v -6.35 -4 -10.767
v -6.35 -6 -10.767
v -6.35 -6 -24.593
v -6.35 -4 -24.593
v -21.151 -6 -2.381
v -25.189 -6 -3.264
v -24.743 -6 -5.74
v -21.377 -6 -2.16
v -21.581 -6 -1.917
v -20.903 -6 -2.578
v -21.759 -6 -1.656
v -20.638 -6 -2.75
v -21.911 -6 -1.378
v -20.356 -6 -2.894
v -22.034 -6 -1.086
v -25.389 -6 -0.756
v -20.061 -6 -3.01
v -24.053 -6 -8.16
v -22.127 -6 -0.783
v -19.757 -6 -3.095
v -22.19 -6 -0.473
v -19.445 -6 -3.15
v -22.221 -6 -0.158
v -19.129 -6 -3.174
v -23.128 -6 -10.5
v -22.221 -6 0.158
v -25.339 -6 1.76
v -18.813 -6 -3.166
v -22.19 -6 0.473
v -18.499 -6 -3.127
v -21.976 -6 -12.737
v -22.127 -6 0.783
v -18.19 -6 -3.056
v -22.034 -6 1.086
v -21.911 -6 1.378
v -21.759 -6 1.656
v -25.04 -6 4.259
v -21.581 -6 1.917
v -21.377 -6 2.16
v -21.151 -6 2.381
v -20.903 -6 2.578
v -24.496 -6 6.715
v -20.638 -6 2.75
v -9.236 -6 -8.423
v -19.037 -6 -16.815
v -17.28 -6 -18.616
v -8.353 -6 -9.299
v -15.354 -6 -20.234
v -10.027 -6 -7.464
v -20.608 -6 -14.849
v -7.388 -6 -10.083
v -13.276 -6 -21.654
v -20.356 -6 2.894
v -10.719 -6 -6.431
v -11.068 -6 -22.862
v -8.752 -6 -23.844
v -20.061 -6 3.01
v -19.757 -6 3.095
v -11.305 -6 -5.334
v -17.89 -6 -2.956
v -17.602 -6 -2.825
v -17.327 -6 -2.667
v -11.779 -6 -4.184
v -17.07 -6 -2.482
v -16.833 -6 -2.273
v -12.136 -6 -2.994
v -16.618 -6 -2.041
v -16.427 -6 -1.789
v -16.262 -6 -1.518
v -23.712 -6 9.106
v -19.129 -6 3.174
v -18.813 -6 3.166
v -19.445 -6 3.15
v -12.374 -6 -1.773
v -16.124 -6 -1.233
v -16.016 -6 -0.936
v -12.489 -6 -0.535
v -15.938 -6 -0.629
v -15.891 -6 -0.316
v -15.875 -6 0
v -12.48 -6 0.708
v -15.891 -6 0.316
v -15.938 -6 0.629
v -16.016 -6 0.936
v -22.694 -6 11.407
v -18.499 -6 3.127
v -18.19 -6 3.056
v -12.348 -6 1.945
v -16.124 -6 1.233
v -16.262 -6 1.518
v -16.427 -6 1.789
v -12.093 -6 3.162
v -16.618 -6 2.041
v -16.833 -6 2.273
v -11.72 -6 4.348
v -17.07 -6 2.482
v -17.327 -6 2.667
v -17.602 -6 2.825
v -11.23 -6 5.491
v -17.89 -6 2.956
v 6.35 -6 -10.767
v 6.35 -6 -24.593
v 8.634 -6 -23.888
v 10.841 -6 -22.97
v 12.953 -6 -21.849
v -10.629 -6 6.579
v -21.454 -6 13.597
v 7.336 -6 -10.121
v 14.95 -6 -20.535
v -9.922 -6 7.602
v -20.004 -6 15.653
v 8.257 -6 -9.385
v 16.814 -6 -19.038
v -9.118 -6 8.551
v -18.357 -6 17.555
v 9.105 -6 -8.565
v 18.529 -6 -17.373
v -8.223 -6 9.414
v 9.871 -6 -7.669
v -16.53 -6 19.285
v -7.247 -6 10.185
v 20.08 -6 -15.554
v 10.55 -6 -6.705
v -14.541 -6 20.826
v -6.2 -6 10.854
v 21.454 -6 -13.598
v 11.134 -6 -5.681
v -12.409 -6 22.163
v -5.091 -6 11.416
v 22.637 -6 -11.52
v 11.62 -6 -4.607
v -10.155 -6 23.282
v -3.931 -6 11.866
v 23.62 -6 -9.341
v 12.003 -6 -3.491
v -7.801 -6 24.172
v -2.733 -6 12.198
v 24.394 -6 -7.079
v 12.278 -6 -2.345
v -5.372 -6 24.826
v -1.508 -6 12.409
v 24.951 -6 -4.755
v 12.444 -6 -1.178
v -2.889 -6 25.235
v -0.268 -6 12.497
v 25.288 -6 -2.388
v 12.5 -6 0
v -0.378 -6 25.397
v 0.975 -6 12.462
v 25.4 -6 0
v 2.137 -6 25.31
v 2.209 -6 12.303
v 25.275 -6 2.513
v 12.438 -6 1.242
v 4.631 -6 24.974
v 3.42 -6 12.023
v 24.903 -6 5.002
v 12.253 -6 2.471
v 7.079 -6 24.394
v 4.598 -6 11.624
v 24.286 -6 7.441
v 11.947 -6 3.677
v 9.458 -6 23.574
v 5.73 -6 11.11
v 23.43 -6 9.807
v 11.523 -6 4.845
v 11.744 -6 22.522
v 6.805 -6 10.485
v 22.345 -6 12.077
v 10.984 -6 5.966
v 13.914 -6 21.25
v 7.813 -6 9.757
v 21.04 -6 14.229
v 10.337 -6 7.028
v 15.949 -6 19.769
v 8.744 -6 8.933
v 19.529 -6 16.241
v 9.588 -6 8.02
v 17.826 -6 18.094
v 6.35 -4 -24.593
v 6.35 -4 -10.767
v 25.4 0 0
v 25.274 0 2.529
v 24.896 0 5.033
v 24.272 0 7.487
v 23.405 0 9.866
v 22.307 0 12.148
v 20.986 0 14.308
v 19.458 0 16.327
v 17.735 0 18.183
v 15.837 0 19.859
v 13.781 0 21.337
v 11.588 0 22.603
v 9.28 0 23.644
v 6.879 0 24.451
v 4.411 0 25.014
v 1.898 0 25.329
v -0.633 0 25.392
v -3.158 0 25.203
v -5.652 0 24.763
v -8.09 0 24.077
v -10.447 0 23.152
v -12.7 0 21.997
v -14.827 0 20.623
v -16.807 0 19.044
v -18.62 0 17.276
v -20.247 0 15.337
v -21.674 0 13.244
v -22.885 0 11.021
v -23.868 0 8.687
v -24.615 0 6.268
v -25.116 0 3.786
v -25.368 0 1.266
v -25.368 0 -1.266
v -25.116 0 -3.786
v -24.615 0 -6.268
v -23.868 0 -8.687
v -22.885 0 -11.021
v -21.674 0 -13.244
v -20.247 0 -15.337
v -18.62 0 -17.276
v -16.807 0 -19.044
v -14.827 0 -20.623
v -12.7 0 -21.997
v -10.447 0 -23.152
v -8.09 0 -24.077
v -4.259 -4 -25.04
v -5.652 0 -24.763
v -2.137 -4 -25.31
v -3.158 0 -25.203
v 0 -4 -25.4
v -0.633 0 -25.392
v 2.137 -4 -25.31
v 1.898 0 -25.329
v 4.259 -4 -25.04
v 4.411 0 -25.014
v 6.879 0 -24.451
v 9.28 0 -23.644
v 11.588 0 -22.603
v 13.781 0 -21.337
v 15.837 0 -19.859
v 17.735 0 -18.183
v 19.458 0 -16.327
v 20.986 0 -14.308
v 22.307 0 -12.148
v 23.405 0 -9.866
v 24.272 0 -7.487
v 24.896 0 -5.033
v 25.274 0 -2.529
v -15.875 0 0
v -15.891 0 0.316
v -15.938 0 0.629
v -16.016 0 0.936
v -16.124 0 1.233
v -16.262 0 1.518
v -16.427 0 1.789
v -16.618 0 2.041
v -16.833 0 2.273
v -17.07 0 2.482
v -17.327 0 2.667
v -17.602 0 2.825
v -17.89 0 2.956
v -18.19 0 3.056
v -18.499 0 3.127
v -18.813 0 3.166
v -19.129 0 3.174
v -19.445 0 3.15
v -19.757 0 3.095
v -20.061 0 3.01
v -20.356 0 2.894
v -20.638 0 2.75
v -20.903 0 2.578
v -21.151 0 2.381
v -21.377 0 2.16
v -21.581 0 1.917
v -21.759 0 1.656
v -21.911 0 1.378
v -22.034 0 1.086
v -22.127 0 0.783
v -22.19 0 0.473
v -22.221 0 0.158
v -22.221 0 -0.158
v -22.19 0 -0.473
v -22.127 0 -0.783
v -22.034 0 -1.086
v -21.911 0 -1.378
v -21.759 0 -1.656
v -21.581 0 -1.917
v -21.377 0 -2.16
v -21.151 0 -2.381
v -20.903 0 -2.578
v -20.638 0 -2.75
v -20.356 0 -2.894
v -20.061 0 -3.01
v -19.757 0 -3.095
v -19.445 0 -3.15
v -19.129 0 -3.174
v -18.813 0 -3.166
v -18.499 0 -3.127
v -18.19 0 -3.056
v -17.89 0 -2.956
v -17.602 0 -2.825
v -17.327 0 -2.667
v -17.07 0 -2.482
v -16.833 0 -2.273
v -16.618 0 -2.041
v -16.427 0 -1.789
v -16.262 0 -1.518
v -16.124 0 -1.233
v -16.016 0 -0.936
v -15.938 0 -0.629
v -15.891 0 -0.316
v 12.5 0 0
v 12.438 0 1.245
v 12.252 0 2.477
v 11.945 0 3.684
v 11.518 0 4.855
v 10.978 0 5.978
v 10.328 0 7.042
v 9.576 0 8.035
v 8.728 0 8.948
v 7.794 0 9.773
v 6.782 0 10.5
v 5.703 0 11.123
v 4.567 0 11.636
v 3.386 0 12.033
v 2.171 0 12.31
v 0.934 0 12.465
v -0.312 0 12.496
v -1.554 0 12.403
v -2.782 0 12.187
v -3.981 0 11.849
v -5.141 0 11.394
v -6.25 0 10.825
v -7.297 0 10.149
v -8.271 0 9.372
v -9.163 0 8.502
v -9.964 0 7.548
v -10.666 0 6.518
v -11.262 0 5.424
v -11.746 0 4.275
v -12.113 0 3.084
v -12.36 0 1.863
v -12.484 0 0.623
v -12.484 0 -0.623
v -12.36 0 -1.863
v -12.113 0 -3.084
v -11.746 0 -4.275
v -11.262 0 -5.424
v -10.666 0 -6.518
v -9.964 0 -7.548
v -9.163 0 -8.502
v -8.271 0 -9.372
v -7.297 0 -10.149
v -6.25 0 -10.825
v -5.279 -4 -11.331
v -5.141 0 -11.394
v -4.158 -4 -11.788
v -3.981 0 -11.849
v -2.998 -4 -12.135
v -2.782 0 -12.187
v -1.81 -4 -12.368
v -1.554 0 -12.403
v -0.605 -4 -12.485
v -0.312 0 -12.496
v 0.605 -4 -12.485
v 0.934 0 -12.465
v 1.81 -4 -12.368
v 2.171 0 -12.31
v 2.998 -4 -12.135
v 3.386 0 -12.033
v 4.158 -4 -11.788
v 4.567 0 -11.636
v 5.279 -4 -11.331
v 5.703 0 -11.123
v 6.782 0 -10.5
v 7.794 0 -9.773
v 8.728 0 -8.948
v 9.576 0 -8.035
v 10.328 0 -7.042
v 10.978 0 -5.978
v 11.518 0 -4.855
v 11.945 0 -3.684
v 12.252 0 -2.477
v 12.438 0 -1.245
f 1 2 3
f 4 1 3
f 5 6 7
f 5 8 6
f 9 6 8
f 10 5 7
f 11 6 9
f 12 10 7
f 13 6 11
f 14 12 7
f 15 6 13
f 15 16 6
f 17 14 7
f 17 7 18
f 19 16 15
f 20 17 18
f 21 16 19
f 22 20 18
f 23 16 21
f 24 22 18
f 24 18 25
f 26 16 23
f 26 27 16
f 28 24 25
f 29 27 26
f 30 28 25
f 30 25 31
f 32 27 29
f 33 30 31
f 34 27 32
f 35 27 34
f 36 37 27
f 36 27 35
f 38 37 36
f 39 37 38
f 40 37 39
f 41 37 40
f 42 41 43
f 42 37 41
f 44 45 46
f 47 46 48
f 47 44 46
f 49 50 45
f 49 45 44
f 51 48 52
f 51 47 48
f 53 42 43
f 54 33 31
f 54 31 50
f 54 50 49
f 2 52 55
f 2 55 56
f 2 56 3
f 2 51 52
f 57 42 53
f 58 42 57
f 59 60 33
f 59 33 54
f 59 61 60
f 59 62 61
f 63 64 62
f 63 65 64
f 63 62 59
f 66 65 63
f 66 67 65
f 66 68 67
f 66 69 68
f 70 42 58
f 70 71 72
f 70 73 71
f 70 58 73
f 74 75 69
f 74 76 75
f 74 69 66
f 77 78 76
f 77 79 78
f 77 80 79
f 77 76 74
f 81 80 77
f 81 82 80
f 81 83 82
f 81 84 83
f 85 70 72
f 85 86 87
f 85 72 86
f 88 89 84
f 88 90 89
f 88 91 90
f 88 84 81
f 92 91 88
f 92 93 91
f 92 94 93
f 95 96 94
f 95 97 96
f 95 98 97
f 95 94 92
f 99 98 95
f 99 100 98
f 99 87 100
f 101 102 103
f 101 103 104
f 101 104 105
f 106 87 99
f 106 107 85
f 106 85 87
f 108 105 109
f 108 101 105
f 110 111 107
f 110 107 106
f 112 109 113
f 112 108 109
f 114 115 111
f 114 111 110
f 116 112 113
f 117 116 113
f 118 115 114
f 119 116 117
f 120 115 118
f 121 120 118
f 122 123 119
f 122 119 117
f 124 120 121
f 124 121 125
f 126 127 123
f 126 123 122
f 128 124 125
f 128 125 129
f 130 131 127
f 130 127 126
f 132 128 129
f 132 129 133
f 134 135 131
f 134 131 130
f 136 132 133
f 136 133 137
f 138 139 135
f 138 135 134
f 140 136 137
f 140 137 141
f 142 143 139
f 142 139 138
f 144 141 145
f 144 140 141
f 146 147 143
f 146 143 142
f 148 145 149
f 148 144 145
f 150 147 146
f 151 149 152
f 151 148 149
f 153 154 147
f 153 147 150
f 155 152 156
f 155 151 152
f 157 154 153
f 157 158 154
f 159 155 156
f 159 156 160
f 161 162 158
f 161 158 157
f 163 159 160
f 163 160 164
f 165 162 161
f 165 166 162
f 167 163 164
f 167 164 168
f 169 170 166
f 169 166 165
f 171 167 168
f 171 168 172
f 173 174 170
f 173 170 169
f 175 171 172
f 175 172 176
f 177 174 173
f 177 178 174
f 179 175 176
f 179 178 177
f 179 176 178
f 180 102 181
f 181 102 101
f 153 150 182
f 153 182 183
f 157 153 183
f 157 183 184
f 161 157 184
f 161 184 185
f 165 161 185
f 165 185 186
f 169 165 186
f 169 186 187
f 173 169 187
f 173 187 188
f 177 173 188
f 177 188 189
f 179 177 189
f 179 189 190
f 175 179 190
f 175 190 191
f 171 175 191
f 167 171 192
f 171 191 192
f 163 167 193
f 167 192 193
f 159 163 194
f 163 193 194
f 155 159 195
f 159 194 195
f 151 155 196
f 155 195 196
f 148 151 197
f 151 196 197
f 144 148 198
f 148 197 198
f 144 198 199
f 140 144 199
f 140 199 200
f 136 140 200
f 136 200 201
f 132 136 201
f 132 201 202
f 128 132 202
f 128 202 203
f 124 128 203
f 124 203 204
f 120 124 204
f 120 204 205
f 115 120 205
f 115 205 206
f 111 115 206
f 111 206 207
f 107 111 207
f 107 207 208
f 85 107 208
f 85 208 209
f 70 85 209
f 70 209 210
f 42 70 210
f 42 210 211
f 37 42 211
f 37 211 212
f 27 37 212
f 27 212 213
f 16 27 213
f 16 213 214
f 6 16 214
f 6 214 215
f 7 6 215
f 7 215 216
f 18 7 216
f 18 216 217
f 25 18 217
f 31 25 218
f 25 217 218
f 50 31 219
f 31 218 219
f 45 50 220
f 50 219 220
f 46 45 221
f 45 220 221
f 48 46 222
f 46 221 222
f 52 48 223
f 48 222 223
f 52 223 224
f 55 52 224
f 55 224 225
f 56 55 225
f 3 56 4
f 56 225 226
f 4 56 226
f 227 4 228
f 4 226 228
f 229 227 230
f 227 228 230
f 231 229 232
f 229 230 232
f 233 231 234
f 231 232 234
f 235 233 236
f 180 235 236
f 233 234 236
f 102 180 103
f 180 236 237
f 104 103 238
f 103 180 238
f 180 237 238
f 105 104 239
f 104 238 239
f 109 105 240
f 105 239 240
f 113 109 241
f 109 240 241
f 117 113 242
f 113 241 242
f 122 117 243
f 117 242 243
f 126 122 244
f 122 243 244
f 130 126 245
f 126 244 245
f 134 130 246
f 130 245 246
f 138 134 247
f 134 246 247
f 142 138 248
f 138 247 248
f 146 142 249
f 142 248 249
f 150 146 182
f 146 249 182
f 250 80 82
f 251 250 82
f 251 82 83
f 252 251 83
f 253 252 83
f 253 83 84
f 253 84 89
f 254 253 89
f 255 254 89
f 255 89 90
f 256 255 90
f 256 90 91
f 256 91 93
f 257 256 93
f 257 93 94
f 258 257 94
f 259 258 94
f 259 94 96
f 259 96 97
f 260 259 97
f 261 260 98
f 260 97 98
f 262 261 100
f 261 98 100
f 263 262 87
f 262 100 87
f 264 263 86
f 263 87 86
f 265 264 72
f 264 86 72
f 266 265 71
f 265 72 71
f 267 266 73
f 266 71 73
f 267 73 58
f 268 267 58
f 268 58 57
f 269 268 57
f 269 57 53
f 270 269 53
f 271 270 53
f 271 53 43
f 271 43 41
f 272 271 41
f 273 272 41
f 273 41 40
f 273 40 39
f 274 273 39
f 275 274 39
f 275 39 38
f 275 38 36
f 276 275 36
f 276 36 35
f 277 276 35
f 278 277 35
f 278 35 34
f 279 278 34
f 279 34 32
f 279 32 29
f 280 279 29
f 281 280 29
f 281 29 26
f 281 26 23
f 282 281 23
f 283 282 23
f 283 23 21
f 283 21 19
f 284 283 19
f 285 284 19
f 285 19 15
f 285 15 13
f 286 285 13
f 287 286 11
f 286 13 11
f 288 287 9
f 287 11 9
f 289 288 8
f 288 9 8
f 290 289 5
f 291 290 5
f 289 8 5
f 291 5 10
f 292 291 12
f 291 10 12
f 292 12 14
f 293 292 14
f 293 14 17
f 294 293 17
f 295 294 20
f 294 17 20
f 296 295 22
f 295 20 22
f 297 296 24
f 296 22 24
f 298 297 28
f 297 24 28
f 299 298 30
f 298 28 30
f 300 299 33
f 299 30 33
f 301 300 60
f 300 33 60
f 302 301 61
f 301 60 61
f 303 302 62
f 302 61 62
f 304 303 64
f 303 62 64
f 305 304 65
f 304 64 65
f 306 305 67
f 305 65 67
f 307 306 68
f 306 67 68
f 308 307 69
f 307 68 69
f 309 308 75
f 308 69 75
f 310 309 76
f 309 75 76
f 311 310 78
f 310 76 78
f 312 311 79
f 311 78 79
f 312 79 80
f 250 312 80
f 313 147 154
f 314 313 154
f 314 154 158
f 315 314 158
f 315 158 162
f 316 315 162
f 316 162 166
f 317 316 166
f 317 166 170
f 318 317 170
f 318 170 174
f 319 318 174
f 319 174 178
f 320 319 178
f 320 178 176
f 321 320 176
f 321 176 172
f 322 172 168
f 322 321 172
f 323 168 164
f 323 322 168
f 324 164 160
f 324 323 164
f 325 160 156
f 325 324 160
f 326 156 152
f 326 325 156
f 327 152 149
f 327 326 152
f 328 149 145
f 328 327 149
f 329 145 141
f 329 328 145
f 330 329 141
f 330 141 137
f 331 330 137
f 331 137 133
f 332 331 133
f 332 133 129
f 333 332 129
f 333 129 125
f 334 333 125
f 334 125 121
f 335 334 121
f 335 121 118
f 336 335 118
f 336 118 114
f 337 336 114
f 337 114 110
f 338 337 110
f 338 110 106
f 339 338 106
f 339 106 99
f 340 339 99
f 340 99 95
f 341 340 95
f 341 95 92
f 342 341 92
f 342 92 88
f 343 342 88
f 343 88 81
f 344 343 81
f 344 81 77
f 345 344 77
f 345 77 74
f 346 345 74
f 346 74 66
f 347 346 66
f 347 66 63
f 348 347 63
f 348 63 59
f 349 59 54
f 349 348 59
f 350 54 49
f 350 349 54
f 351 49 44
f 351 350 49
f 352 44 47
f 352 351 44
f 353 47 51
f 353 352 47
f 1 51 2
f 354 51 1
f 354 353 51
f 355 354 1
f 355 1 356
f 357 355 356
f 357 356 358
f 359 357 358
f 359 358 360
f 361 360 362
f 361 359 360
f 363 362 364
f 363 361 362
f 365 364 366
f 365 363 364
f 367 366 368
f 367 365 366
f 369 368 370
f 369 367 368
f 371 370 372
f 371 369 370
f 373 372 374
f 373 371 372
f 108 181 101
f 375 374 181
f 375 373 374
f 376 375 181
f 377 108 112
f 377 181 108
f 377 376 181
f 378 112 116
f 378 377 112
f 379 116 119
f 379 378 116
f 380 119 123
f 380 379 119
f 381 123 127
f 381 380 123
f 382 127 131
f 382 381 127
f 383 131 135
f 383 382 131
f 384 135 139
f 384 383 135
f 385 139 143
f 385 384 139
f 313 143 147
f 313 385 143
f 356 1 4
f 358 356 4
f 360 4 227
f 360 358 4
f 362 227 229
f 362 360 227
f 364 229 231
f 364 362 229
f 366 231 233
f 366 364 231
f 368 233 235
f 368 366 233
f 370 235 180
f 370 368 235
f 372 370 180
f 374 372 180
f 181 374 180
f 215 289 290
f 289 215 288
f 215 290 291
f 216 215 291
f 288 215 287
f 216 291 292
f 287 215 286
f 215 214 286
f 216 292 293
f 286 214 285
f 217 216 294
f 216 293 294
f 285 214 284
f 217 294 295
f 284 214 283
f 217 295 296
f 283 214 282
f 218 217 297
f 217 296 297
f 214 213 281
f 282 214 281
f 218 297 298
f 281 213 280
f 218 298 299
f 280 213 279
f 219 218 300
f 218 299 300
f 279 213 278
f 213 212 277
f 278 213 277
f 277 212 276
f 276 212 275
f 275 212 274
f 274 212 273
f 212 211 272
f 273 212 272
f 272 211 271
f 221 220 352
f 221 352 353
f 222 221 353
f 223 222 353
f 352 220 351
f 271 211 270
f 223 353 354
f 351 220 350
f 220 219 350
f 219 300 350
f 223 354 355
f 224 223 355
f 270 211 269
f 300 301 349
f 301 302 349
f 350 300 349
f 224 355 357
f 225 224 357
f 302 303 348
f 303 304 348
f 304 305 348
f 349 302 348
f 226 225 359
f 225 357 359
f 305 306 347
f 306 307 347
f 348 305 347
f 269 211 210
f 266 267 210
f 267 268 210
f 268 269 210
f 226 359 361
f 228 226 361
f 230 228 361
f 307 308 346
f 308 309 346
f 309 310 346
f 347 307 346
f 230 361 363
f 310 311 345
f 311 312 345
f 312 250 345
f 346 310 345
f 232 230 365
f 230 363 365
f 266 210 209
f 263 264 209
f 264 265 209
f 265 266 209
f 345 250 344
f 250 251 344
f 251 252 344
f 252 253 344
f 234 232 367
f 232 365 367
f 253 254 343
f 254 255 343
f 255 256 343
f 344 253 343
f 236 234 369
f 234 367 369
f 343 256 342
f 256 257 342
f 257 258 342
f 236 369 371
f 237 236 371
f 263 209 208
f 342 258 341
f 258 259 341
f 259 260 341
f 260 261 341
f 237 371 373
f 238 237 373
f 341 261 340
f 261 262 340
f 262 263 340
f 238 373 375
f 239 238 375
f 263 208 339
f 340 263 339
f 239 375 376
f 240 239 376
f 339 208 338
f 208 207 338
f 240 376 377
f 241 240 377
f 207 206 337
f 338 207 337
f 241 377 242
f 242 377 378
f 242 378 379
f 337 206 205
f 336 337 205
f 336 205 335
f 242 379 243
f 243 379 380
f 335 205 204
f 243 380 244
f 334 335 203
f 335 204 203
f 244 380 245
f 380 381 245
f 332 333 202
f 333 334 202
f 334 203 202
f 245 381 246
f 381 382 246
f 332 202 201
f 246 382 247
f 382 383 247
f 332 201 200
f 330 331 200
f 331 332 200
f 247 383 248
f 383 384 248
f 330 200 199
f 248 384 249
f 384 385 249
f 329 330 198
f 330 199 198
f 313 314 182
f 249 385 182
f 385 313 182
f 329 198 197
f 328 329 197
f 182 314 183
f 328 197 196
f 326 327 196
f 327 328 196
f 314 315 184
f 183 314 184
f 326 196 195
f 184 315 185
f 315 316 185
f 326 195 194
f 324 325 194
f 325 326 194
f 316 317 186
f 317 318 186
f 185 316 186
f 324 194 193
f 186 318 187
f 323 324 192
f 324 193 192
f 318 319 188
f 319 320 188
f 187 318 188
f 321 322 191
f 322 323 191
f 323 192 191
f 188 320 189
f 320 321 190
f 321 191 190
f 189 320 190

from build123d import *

# Parameters (mm, degrees)
F0_R     = 25.4
F0_R_2   = 12.5
F1_DEPTH = 6
F3_DEPTH = 2
F4_R     = 3.175
F5_DEPTH = 6.001


with BuildPart() as f1:
    # F0 (on Front) → F1 (new body)
    with BuildSketch(Plane.XZ):
        Circle(F0_R)
        Circle(F0_R_2, mode=Mode.SUBTRACT)
    extrude(amount=F1_DEPTH)

    # F2 (on face) → F3 (cut)
    with BuildSketch(Plane.XZ.offset(6)):
        with BuildLine():
            ThreePointArc((-6.35, -24.5934442484), (0, -25.4), (6.35, -24.5934442484))
            Line((6.35, -24.5934442484), (6.35, -10.7669633602))
            ThreePointArc((6.35, -10.7669633602), (0, -12.5), (-6.35, -10.7669633602))
            Line((-6.35, -10.7669633602), (-6.35, -24.5934442484))
        make_face()
    extrude(amount=-F3_DEPTH, mode=Mode.SUBTRACT)

    # F4 (on face) → F5 (cut, through all)
    with BuildSketch(Plane.XZ.offset(6)):
        with Locations((-19.05, 0)):
            Circle(F4_R)
    extrude(amount=-F5_DEPTH, mode=Mode.SUBTRACT)


solid = f1.part
